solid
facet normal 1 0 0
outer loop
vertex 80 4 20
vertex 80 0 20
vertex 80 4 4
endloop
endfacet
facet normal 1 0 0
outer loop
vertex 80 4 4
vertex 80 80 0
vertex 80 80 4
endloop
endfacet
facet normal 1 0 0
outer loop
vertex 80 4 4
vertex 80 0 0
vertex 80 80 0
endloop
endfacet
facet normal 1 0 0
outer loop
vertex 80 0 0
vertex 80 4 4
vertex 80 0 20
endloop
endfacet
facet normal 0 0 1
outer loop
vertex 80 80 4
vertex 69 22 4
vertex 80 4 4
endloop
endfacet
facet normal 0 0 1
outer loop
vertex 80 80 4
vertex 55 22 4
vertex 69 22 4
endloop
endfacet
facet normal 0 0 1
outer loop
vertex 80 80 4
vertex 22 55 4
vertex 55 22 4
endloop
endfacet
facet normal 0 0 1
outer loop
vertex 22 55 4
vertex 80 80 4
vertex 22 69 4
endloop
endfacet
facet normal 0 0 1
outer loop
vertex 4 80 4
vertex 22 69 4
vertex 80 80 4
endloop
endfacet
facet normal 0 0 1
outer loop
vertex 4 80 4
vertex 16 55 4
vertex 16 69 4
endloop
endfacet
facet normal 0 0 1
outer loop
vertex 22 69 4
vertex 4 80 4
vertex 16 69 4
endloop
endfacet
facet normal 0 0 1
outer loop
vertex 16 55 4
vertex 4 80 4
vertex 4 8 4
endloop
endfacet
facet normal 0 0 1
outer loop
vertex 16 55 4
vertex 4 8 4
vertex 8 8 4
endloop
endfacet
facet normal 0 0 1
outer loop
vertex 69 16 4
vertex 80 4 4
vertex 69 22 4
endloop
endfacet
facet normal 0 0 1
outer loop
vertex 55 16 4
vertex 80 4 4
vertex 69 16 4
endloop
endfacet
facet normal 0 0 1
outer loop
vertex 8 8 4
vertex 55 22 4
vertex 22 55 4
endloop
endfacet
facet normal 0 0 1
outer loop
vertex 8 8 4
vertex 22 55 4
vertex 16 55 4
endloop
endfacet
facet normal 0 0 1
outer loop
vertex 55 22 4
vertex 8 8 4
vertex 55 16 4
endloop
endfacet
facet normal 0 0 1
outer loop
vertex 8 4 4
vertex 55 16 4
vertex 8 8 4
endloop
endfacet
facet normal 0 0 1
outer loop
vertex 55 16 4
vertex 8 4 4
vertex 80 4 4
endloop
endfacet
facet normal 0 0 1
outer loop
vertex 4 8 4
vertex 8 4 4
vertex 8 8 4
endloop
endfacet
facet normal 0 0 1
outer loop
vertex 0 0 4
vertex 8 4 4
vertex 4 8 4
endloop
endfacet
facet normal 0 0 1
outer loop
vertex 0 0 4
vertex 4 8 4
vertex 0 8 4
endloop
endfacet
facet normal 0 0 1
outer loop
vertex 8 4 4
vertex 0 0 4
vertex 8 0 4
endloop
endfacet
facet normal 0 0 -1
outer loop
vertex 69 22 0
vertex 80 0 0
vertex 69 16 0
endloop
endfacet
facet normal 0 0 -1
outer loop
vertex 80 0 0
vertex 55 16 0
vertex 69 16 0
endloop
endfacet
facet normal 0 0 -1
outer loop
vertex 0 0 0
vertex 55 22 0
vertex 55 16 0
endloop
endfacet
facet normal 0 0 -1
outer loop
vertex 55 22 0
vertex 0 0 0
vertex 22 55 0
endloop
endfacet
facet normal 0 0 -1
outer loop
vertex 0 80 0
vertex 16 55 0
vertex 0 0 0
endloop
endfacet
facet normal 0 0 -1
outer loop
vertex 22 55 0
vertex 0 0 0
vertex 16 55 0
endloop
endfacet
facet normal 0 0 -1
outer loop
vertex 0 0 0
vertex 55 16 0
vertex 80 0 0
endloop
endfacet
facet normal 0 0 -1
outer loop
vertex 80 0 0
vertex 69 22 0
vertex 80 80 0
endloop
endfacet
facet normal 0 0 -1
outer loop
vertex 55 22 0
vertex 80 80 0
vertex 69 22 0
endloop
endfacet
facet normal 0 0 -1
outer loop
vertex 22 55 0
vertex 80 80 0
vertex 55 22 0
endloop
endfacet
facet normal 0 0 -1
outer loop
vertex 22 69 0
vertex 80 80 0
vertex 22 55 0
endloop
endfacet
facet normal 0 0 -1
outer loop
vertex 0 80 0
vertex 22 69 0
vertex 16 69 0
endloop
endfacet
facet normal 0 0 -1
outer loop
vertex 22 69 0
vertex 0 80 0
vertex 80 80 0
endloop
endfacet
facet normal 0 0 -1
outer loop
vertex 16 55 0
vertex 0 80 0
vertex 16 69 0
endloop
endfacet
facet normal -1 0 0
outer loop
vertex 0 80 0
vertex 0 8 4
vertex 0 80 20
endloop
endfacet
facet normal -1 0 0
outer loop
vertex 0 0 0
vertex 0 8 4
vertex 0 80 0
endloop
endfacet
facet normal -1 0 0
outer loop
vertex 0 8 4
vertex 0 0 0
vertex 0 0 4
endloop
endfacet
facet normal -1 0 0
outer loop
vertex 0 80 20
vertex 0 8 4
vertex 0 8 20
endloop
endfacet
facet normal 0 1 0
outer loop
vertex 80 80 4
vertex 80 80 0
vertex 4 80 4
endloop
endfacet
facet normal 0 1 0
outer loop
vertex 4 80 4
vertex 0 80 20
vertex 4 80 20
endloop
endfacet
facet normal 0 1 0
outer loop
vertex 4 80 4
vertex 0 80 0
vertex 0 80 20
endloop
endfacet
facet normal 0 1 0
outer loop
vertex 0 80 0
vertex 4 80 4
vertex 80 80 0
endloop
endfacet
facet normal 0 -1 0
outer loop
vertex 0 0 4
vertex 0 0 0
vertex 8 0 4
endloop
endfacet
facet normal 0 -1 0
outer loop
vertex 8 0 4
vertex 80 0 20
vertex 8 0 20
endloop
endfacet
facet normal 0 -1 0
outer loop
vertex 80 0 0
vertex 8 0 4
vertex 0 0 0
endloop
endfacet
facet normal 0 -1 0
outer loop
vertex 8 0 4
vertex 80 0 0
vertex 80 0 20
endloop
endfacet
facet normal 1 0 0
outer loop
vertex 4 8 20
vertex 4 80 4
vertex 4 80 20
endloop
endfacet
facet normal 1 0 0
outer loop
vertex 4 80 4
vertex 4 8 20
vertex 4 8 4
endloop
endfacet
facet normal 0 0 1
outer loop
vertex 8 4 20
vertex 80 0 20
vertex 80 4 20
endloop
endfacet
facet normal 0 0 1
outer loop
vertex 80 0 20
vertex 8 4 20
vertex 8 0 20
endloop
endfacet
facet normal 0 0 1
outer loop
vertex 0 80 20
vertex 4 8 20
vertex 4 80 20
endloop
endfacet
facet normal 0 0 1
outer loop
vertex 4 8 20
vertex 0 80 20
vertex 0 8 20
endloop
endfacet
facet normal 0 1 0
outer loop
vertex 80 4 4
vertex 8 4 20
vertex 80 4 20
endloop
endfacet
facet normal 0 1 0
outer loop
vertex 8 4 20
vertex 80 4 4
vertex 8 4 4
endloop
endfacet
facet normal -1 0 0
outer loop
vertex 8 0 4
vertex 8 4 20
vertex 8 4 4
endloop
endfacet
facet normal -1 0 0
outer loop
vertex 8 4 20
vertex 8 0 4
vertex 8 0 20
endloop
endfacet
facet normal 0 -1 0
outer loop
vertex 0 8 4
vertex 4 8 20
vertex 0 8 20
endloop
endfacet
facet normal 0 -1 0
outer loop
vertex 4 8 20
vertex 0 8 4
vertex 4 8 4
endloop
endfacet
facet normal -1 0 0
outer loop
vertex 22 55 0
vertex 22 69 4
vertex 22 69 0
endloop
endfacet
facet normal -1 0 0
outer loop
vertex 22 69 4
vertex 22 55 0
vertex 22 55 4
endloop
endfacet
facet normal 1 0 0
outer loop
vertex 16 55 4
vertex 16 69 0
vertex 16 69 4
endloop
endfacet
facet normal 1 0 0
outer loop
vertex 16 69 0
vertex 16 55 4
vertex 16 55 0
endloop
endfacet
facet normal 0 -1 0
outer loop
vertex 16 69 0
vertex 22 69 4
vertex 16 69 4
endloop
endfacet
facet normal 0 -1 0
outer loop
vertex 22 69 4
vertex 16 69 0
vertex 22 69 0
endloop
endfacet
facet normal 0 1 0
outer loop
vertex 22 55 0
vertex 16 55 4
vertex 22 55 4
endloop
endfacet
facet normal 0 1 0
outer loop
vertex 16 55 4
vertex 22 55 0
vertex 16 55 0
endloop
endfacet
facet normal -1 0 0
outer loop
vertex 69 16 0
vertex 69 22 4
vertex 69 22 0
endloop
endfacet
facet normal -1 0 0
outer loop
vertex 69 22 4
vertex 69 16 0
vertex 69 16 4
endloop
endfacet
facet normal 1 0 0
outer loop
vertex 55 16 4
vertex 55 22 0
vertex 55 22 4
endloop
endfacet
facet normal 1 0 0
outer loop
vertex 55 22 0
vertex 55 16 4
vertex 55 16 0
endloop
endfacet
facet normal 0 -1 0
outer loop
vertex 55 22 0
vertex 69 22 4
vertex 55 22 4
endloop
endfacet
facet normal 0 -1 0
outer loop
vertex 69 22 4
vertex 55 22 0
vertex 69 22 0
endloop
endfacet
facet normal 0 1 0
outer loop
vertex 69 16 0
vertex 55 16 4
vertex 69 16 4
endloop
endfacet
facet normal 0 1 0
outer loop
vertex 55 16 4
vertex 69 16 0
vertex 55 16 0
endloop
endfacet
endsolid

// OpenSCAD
// Original MechIntel educational model. CC0-1.0. Units: mm.
// Not a standardized or load-rated component.
$fn=96;
length=80;
width=80;
base=4;
fence=4;
height=20;
$fn=64;
difference(){union(){
translate([0,0,0]) cube([length,width,base]);
translate([0,0,base]) cube([fence,width,height-base]);
translate([0,0,base]) cube([length,fence,height-base]);
}
translate([0,0,base]) cube([fence+4,fence+4,height]);
translate([16,55,-1]) cube([6,14,base+2]);
translate([55,16,-1]) cube([14,6,base+2]);
}
